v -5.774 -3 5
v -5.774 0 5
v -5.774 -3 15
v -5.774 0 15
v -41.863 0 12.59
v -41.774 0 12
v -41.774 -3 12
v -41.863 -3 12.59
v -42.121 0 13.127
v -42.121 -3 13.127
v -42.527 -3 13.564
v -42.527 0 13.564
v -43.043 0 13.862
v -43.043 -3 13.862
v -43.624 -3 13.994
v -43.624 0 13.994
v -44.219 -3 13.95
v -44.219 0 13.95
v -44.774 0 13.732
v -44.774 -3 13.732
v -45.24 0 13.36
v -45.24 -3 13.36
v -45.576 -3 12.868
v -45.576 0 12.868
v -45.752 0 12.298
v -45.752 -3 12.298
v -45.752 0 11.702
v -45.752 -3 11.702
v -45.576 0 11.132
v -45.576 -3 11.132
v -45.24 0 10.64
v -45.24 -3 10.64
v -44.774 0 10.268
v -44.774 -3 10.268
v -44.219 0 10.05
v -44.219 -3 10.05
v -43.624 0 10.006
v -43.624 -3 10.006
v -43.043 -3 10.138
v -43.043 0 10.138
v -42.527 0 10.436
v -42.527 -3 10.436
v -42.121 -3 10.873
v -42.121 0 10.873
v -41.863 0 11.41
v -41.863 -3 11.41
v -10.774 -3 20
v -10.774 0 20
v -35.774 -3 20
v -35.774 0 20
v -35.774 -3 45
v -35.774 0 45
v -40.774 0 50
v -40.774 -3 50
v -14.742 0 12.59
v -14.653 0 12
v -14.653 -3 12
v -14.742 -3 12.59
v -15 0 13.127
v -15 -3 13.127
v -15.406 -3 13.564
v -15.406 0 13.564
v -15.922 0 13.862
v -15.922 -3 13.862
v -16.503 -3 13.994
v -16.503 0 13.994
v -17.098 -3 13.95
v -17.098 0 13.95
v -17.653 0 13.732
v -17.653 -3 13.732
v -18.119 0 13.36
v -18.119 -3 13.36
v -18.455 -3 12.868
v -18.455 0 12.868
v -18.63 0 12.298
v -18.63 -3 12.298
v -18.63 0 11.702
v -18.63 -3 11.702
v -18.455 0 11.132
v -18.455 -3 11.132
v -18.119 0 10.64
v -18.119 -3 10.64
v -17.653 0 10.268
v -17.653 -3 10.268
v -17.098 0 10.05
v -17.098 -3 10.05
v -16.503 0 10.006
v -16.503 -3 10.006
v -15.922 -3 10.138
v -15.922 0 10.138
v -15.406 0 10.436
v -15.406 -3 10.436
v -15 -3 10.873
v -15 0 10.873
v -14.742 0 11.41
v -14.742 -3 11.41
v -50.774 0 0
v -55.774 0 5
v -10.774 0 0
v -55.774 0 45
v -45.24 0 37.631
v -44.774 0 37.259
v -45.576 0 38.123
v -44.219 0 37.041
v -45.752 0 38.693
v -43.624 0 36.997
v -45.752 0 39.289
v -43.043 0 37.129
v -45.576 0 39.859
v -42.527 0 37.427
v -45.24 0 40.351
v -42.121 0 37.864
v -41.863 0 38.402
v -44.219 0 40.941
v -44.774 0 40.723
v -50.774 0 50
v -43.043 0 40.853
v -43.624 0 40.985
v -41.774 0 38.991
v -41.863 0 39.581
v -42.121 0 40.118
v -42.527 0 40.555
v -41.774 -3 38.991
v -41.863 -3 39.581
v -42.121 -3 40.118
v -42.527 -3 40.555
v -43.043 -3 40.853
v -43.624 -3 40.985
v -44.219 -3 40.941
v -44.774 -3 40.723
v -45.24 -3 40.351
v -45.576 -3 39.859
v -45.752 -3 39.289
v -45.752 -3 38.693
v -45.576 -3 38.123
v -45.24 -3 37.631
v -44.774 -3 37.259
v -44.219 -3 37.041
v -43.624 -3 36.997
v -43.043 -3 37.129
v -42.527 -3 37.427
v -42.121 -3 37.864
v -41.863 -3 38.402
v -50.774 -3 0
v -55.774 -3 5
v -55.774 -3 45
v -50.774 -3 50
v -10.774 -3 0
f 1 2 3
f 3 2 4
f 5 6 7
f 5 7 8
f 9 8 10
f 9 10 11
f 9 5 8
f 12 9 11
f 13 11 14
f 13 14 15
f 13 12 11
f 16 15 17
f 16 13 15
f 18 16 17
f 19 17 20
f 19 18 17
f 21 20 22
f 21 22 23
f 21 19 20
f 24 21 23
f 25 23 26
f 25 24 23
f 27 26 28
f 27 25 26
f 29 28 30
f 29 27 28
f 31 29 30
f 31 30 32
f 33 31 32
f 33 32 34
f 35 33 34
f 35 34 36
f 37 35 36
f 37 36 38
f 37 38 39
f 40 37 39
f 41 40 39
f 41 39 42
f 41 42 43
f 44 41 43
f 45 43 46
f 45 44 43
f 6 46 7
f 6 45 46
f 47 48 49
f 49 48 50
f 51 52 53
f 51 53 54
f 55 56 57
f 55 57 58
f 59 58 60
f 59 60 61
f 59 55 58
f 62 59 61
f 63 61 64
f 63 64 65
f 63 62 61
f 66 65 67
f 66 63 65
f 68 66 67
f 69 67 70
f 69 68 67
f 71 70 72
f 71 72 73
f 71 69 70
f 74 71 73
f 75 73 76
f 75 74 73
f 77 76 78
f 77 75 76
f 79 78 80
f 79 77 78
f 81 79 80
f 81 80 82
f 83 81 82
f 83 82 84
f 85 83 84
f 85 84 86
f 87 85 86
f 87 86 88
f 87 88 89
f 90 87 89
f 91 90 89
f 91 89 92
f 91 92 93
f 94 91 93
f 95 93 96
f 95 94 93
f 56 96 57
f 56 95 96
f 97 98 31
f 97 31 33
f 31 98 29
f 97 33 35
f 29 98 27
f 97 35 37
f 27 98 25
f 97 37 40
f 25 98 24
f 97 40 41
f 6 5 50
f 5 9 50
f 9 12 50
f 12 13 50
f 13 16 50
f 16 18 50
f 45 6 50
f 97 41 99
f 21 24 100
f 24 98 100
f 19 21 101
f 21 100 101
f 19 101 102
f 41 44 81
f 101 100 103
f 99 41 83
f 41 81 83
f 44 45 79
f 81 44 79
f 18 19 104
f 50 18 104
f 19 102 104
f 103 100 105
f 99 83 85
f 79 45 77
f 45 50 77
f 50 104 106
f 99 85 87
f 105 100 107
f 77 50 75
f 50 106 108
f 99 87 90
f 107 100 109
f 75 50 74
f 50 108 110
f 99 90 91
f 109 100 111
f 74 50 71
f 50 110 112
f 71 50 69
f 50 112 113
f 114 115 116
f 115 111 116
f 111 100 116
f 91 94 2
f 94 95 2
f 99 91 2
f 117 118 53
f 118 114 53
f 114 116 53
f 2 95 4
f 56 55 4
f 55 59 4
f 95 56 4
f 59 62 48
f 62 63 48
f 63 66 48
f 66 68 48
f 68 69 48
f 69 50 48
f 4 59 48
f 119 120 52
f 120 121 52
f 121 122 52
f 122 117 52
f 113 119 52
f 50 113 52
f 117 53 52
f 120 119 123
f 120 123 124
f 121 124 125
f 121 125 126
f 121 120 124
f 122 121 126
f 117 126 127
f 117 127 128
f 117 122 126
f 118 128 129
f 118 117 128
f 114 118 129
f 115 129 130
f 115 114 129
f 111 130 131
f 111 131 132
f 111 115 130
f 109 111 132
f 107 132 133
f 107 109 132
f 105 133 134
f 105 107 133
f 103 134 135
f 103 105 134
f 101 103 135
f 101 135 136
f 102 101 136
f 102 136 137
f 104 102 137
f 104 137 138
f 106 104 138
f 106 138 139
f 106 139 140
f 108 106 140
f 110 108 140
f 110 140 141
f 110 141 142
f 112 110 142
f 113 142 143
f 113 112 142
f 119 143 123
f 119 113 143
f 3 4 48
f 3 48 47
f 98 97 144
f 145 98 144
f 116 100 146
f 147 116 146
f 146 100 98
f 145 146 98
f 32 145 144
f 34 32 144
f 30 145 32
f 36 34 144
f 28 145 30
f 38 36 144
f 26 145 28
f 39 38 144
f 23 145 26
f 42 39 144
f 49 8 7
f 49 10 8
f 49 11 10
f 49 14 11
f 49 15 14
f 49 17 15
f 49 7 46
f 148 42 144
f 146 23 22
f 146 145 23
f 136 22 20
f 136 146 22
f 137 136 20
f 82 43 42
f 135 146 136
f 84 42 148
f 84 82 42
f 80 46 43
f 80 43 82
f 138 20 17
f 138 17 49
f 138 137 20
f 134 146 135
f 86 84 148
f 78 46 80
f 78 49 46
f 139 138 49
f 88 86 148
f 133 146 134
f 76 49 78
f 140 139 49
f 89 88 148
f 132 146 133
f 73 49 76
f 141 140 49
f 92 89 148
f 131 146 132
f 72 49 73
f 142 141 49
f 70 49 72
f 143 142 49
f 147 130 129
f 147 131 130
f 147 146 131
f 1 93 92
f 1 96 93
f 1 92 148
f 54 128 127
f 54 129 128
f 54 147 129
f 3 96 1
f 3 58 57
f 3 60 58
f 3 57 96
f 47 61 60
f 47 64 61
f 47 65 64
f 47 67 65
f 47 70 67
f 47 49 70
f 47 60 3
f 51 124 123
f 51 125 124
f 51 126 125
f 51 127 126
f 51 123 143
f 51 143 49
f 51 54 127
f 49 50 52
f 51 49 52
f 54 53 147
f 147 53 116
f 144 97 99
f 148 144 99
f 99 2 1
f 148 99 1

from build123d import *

# Parameters (mm, degrees)
F0_R     = 2
F1_DEPTH = 3
F2_SIZE  = 5


with BuildPart() as f1:
    # F0 (on Front) → F1 (new body)
    with BuildSketch(Plane.XZ):
        Polygon((-35.773953, 50), (-55.773953, 50), (-55.773953, 0), (-5.773953, 0), (-5.773953, 20), (-35.773953, 20), align=None)
        with Locations((-43.773953, 12)):
            Circle(F0_R, mode=Mode.SUBTRACT)
        with Locations((-16.65267, 12)):
            Circle(F0_R, mode=Mode.SUBTRACT)
        with Locations((-43.773953, 38.991082)):
            Circle(F0_R, mode=Mode.SUBTRACT)
    extrude(amount=F1_DEPTH)

    # F2
    f2_edges = [f1.edges().sort_by_distance(p)[0] for p in [
        (-55.773953, -1.5, 50),
        (-35.773953, -1.5, 50),
        (-5.773953, -1.5, 20),
        (-5.773953, -1.5, 0),
        (-55.773953, -1.5, 0),
    ]]
    chamfer(f2_edges, length=F2_SIZE)


solid = f1.part
